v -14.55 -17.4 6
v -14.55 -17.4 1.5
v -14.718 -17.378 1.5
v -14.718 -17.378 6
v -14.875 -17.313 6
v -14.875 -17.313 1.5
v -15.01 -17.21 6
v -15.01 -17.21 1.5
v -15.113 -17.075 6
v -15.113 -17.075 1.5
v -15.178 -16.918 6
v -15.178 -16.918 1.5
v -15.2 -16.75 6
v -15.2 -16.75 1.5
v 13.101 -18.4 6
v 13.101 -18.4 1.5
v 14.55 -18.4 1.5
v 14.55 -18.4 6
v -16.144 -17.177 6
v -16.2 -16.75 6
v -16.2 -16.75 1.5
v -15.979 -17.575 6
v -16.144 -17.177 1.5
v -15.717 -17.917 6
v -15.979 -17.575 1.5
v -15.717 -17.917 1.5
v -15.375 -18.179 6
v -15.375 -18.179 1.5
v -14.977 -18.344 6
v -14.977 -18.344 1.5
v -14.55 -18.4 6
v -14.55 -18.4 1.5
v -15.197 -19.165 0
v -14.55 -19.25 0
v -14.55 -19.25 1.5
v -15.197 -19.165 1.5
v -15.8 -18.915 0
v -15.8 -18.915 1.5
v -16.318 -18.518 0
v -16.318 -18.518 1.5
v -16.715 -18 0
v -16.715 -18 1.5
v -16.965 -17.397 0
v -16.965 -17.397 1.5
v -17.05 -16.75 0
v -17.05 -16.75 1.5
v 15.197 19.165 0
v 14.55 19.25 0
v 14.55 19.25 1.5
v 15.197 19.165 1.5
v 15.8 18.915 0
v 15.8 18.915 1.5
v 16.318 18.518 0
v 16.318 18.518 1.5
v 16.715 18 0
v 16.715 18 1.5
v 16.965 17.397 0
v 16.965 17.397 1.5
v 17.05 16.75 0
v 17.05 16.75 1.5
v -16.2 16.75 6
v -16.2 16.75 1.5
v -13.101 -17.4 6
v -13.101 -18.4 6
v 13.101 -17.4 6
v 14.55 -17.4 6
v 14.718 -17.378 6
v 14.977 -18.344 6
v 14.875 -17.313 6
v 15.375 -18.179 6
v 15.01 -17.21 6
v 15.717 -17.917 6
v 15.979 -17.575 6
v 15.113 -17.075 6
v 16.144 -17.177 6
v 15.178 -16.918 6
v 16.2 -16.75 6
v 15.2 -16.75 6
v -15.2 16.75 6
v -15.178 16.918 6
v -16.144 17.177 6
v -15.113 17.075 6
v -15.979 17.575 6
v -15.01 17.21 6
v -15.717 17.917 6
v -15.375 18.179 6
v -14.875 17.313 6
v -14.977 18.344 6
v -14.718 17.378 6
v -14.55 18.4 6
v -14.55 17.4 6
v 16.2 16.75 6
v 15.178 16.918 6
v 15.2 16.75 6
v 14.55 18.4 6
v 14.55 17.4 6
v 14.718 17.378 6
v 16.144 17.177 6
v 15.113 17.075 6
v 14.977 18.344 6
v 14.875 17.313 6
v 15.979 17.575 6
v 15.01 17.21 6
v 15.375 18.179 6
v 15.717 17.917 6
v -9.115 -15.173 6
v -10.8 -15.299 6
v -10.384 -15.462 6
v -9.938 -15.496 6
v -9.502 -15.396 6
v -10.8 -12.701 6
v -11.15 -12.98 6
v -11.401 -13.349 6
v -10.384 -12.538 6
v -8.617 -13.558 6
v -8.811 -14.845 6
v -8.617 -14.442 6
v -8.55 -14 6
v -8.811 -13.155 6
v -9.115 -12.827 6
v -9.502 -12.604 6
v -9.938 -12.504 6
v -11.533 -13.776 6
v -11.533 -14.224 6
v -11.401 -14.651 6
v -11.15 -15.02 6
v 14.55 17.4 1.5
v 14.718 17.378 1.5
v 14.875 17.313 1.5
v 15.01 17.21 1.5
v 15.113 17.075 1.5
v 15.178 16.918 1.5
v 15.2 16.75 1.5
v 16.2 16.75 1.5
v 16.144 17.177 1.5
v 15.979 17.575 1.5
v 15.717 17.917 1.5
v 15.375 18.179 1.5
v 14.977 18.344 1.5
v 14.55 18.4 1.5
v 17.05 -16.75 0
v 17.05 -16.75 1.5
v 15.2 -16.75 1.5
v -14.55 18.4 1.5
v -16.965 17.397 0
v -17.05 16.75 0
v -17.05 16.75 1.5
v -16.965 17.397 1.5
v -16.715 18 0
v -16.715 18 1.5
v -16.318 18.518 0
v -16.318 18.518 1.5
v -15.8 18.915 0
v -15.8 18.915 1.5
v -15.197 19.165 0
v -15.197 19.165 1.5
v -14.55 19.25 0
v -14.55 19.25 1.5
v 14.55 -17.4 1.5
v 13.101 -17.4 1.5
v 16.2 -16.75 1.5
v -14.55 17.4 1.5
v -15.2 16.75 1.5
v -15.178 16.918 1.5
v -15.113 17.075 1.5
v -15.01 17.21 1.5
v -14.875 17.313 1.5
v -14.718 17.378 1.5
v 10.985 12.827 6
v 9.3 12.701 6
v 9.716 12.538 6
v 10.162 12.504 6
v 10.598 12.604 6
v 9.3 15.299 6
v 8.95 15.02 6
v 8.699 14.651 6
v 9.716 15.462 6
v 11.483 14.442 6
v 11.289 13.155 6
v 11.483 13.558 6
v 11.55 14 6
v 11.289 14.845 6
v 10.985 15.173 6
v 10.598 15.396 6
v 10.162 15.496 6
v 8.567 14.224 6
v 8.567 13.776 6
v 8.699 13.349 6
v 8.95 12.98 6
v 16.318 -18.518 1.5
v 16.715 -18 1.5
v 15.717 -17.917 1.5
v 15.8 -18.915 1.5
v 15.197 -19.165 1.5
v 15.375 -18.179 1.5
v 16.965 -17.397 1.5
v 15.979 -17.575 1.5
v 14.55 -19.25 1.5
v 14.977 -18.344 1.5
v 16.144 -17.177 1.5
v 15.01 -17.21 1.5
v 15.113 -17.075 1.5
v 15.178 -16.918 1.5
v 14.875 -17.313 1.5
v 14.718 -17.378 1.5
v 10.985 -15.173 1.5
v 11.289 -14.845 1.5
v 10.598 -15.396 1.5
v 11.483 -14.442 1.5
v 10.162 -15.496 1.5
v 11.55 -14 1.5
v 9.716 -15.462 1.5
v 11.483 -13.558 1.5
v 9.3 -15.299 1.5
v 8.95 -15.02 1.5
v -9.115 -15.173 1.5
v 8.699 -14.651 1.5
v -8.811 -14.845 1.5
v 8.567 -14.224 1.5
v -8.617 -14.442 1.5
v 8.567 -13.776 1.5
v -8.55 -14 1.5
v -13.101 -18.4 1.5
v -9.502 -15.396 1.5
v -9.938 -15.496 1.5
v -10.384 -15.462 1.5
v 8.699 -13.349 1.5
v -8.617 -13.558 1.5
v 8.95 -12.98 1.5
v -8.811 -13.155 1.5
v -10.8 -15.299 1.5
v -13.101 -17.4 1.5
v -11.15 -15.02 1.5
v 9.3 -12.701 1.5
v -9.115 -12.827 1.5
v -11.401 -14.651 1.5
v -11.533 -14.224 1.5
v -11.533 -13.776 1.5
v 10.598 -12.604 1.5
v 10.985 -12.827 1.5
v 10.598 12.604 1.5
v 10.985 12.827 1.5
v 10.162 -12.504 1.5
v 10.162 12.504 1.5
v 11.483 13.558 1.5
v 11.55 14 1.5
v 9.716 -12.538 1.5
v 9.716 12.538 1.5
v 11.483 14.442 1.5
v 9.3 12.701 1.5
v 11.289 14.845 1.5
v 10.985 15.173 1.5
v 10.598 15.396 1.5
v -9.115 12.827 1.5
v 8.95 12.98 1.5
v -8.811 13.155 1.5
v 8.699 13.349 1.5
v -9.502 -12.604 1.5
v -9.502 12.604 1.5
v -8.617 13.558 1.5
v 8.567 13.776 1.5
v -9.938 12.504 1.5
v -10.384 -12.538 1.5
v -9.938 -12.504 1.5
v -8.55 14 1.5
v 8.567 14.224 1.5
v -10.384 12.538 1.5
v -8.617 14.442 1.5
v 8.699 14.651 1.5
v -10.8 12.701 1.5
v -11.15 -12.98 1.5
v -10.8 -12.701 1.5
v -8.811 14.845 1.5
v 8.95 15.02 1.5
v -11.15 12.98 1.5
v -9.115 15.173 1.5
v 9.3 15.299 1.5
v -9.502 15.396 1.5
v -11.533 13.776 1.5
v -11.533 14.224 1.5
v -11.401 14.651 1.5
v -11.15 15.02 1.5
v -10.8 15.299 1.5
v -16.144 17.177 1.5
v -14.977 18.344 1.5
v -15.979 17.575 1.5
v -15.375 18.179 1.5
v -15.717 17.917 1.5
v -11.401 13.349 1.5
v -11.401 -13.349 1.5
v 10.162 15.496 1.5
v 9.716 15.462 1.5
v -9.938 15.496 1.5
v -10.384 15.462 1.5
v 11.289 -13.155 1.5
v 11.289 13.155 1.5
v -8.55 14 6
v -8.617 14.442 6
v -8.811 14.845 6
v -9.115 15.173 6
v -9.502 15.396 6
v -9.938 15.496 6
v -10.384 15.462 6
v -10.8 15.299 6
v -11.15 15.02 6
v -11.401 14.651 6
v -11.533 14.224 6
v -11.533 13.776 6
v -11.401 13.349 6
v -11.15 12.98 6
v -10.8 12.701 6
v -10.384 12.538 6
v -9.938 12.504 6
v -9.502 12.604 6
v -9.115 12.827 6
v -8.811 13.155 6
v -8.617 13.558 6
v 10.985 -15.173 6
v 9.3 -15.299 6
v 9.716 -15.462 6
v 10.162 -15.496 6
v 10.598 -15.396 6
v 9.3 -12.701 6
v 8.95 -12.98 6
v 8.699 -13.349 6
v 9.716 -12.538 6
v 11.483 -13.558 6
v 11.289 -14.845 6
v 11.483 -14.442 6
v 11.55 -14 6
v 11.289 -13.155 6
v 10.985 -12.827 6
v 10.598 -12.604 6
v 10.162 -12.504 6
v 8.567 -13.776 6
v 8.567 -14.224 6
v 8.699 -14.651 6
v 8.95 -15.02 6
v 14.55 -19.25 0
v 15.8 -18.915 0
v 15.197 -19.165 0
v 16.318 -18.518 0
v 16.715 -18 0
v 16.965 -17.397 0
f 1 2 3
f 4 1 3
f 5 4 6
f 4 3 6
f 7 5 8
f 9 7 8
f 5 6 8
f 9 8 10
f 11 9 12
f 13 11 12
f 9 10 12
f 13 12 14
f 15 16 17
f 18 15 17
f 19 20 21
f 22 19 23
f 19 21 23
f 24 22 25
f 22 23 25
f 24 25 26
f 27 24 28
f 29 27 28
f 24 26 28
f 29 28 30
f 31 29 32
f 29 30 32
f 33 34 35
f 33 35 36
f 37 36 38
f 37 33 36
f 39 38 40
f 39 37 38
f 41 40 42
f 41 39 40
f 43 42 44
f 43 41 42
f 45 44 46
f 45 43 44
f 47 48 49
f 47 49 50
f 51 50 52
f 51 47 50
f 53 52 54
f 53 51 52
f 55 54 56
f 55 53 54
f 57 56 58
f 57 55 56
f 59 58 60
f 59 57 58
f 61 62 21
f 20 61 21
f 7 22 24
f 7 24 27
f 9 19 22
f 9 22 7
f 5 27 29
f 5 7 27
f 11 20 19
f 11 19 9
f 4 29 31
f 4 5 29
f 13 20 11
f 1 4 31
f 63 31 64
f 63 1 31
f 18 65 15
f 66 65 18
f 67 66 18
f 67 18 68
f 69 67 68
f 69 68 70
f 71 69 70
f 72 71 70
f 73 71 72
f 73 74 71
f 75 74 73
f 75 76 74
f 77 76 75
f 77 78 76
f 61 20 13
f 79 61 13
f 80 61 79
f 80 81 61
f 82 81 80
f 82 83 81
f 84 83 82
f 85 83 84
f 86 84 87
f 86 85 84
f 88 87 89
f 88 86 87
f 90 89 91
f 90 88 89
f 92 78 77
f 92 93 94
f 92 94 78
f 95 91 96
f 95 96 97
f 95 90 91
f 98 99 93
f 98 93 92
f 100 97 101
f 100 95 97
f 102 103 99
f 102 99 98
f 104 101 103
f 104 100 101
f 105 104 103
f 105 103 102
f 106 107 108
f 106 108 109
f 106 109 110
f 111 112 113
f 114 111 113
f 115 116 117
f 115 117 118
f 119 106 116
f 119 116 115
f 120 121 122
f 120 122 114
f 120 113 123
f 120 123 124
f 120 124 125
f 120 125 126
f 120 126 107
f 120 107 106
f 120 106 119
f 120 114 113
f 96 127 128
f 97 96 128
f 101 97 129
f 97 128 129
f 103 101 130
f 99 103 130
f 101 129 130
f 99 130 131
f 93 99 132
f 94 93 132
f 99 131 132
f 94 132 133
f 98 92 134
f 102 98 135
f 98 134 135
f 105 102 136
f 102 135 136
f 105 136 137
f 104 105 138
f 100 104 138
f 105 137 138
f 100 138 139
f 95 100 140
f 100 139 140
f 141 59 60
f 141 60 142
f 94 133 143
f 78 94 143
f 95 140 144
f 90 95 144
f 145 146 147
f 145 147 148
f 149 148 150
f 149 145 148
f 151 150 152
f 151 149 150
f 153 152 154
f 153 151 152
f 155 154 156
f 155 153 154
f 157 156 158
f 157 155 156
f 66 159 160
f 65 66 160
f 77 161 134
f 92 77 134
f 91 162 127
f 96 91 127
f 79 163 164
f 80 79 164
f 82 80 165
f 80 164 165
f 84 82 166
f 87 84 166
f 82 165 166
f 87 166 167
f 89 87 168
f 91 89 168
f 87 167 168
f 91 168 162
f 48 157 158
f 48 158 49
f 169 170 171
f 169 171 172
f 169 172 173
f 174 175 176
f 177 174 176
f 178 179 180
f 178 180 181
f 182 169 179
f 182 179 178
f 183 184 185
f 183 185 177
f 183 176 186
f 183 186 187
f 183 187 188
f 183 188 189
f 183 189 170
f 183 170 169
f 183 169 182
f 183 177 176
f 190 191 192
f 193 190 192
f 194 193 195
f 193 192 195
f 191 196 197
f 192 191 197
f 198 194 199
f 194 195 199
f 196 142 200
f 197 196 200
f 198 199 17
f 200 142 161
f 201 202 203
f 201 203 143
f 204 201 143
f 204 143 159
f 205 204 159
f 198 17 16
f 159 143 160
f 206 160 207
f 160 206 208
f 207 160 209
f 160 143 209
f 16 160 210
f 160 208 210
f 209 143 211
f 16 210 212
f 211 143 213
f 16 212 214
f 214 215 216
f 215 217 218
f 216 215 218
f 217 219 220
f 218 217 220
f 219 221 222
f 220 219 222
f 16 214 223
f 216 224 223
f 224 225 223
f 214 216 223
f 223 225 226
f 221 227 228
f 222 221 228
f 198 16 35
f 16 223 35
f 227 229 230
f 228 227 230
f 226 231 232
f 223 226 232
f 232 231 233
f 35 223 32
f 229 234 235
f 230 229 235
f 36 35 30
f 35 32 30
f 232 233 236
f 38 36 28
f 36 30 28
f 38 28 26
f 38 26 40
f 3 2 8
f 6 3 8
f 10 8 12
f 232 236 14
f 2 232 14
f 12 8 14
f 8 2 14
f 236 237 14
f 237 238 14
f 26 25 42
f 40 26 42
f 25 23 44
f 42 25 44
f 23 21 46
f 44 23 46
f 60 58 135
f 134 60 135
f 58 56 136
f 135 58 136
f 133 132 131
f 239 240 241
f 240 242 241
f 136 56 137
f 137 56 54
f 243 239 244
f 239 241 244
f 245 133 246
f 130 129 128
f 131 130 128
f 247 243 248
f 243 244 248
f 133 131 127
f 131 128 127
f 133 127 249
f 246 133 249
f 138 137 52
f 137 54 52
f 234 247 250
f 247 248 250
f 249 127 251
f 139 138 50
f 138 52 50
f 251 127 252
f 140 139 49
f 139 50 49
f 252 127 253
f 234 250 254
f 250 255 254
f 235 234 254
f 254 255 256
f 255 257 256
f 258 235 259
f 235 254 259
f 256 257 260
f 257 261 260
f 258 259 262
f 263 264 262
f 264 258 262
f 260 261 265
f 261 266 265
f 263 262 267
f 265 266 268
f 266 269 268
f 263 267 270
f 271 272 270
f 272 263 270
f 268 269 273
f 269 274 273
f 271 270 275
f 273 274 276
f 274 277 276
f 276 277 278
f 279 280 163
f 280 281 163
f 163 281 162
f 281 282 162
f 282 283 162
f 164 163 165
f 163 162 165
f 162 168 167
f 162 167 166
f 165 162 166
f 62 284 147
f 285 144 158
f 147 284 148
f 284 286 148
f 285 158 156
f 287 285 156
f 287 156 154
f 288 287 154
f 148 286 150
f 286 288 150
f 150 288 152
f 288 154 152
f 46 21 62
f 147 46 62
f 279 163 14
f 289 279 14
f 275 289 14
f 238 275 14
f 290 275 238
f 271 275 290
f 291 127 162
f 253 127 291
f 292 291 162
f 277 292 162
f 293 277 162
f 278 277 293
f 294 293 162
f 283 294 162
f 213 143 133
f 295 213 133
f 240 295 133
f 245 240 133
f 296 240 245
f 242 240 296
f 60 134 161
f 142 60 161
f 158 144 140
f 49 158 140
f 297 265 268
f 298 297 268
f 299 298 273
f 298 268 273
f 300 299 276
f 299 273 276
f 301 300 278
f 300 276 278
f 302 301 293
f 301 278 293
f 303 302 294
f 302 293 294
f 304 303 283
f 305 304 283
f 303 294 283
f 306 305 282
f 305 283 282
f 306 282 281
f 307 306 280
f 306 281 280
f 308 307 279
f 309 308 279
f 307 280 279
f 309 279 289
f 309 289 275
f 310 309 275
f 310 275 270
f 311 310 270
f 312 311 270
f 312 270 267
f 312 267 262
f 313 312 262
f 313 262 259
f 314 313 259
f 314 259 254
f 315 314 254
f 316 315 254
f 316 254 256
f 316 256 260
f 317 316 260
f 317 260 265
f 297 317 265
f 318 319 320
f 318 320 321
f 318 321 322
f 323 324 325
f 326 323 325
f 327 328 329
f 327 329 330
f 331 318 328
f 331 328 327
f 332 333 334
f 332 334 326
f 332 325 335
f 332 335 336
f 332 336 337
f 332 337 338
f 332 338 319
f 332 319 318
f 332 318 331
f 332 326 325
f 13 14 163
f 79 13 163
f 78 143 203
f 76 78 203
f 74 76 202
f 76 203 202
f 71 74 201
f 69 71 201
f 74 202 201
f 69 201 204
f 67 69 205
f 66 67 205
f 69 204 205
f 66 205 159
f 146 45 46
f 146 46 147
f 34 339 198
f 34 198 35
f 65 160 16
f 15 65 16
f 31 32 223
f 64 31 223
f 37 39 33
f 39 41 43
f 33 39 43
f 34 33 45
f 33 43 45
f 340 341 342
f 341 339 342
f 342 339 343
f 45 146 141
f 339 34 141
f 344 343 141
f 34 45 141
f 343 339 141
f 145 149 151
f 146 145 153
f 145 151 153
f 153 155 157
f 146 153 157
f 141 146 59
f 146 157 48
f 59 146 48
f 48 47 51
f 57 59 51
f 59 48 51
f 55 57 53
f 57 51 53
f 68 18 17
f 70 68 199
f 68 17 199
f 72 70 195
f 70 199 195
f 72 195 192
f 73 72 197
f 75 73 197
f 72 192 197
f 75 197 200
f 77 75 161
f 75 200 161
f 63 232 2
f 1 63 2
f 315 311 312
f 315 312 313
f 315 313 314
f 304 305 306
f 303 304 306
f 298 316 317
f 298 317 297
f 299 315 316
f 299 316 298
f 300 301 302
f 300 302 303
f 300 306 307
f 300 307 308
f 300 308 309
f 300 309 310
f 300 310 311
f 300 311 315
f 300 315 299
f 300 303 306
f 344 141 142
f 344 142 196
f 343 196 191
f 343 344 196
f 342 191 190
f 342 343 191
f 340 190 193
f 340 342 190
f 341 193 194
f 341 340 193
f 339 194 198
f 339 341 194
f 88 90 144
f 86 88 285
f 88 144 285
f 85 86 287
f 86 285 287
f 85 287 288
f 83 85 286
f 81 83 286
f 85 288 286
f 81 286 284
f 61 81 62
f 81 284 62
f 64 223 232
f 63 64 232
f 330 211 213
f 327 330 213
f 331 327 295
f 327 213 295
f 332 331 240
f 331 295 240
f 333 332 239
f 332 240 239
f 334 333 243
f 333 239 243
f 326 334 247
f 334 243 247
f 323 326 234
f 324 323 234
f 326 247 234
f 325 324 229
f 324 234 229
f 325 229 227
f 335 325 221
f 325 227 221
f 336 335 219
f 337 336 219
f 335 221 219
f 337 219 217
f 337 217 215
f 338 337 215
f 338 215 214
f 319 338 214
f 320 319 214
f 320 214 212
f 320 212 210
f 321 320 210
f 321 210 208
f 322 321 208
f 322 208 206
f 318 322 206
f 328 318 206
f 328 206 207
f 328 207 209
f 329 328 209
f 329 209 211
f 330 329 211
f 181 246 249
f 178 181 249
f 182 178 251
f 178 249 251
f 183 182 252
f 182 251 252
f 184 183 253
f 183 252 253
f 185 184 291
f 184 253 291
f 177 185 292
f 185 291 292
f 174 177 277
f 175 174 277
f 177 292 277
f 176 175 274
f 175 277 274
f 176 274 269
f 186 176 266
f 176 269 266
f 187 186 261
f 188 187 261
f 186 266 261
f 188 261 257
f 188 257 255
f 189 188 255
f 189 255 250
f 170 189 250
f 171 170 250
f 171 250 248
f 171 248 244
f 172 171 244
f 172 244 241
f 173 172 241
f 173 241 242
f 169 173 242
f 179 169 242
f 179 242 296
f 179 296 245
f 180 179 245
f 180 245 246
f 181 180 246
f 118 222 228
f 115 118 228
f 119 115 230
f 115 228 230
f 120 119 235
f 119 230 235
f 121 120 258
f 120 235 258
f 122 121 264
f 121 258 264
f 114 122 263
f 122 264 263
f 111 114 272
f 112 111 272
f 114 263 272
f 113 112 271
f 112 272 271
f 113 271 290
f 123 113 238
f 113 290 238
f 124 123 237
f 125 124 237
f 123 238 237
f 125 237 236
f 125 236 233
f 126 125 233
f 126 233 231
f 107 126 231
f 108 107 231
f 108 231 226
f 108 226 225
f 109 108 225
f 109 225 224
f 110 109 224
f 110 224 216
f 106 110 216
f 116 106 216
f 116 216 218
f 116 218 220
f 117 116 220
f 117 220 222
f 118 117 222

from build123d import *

# Parameters (mm, degrees)
BOSS_EXTRUDE1_DEPTH = 1.5
SKETCH1_3_R         = 1.5
BOSS_EXTRUDE2_DEPTH = 6


with BuildPart() as part:
    # Sketch1 → Boss-Extrude1 (new body)
    with BuildSketch(Plane.XY):
        with BuildLine():
            ThreePointArc((-17.05, -16.75), (-16.317766953, -18.517766953), (-14.55, -19.25))
            Line((-14.55, -19.25), (14.55, -19.25))
            ThreePointArc((14.55, -19.25), (16.317766953, -18.517766953), (17.05, -16.75))
            Line((17.05, -16.75), (17.05, 16.75))
            ThreePointArc((17.05, 16.75), (16.317766953, 18.517766953), (14.55, 19.25))
            Line((14.55, 19.25), (-14.55, 19.25))
            ThreePointArc((-14.55, 19.25), (-16.317766953, 18.517766953), (-17.05, 16.75))
            Line((-17.05, 16.75), (-17.05, -16.75))
        make_face()
    extrude(amount=BOSS_EXTRUDE1_DEPTH)

    # Sketch1<3> → Boss-Extrude2 (add)
    with BuildSketch(Plane.XY):
        with BuildLine():
            Line((-16.2, 16.75), (-16.2, -16.75))
            ThreePointArc((-16.2, -16.75), (-15.716726189, -17.916726189), (-14.55, -18.4))
            Line((-14.55, -18.4), (-13.10076635, -18.4))
            Line((-13.10076635, -18.4), (-13.10076635, -17.4))
            Line((-13.10076635, -17.4), (-14.55, -17.4))
            ThreePointArc((-14.55, -17.4), (-15.009619408, -17.209619408), (-15.2, -16.75))
            Line((-15.2, -16.75), (-15.2, 16.75))
            ThreePointArc((-15.2, 16.75), (-15.009619408, 17.209619408), (-14.55, 17.4))
            Line((-14.55, 17.4), (14.55, 17.4))
            ThreePointArc((14.55, 17.4), (15.009619408, 17.209619408), (15.2, 16.75))
            Line((15.2, 16.75), (15.2, -16.75))
            ThreePointArc((15.2, -16.75), (15.009619408, -17.209619408), (14.55, -17.4))
            Line((14.55, -17.4), (13.10076635, -17.4))
            Line((13.10076635, -17.4), (13.10076635, -18.4))
            Line((13.10076635, -18.4), (14.55, -18.4))
            ThreePointArc((14.55, -18.4), (15.716726189, -17.916726189), (16.2, -16.75))
            Line((16.2, -16.75), (16.2, 16.75))
            ThreePointArc((16.2, 16.75), (15.716726189, 17.916726189), (14.55, 18.4))
            Line((14.55, 18.4), (-14.55, 18.4))
            ThreePointArc((-14.55, 18.4), (-15.716726189, 17.916726189), (-16.2, 16.75))
        make_face()
        with Locations((-10.05, 14)):
            Circle(SKETCH1_3_R)
        with Locations((10.05, 14)):
            Circle(SKETCH1_3_R)
        with Locations((10.05, -14)):
            Circle(SKETCH1_3_R)
        with Locations((-10.05, -14)):
            Circle(SKETCH1_3_R)
    extrude(amount=BOSS_EXTRUDE2_DEPTH)


solid = part.part
